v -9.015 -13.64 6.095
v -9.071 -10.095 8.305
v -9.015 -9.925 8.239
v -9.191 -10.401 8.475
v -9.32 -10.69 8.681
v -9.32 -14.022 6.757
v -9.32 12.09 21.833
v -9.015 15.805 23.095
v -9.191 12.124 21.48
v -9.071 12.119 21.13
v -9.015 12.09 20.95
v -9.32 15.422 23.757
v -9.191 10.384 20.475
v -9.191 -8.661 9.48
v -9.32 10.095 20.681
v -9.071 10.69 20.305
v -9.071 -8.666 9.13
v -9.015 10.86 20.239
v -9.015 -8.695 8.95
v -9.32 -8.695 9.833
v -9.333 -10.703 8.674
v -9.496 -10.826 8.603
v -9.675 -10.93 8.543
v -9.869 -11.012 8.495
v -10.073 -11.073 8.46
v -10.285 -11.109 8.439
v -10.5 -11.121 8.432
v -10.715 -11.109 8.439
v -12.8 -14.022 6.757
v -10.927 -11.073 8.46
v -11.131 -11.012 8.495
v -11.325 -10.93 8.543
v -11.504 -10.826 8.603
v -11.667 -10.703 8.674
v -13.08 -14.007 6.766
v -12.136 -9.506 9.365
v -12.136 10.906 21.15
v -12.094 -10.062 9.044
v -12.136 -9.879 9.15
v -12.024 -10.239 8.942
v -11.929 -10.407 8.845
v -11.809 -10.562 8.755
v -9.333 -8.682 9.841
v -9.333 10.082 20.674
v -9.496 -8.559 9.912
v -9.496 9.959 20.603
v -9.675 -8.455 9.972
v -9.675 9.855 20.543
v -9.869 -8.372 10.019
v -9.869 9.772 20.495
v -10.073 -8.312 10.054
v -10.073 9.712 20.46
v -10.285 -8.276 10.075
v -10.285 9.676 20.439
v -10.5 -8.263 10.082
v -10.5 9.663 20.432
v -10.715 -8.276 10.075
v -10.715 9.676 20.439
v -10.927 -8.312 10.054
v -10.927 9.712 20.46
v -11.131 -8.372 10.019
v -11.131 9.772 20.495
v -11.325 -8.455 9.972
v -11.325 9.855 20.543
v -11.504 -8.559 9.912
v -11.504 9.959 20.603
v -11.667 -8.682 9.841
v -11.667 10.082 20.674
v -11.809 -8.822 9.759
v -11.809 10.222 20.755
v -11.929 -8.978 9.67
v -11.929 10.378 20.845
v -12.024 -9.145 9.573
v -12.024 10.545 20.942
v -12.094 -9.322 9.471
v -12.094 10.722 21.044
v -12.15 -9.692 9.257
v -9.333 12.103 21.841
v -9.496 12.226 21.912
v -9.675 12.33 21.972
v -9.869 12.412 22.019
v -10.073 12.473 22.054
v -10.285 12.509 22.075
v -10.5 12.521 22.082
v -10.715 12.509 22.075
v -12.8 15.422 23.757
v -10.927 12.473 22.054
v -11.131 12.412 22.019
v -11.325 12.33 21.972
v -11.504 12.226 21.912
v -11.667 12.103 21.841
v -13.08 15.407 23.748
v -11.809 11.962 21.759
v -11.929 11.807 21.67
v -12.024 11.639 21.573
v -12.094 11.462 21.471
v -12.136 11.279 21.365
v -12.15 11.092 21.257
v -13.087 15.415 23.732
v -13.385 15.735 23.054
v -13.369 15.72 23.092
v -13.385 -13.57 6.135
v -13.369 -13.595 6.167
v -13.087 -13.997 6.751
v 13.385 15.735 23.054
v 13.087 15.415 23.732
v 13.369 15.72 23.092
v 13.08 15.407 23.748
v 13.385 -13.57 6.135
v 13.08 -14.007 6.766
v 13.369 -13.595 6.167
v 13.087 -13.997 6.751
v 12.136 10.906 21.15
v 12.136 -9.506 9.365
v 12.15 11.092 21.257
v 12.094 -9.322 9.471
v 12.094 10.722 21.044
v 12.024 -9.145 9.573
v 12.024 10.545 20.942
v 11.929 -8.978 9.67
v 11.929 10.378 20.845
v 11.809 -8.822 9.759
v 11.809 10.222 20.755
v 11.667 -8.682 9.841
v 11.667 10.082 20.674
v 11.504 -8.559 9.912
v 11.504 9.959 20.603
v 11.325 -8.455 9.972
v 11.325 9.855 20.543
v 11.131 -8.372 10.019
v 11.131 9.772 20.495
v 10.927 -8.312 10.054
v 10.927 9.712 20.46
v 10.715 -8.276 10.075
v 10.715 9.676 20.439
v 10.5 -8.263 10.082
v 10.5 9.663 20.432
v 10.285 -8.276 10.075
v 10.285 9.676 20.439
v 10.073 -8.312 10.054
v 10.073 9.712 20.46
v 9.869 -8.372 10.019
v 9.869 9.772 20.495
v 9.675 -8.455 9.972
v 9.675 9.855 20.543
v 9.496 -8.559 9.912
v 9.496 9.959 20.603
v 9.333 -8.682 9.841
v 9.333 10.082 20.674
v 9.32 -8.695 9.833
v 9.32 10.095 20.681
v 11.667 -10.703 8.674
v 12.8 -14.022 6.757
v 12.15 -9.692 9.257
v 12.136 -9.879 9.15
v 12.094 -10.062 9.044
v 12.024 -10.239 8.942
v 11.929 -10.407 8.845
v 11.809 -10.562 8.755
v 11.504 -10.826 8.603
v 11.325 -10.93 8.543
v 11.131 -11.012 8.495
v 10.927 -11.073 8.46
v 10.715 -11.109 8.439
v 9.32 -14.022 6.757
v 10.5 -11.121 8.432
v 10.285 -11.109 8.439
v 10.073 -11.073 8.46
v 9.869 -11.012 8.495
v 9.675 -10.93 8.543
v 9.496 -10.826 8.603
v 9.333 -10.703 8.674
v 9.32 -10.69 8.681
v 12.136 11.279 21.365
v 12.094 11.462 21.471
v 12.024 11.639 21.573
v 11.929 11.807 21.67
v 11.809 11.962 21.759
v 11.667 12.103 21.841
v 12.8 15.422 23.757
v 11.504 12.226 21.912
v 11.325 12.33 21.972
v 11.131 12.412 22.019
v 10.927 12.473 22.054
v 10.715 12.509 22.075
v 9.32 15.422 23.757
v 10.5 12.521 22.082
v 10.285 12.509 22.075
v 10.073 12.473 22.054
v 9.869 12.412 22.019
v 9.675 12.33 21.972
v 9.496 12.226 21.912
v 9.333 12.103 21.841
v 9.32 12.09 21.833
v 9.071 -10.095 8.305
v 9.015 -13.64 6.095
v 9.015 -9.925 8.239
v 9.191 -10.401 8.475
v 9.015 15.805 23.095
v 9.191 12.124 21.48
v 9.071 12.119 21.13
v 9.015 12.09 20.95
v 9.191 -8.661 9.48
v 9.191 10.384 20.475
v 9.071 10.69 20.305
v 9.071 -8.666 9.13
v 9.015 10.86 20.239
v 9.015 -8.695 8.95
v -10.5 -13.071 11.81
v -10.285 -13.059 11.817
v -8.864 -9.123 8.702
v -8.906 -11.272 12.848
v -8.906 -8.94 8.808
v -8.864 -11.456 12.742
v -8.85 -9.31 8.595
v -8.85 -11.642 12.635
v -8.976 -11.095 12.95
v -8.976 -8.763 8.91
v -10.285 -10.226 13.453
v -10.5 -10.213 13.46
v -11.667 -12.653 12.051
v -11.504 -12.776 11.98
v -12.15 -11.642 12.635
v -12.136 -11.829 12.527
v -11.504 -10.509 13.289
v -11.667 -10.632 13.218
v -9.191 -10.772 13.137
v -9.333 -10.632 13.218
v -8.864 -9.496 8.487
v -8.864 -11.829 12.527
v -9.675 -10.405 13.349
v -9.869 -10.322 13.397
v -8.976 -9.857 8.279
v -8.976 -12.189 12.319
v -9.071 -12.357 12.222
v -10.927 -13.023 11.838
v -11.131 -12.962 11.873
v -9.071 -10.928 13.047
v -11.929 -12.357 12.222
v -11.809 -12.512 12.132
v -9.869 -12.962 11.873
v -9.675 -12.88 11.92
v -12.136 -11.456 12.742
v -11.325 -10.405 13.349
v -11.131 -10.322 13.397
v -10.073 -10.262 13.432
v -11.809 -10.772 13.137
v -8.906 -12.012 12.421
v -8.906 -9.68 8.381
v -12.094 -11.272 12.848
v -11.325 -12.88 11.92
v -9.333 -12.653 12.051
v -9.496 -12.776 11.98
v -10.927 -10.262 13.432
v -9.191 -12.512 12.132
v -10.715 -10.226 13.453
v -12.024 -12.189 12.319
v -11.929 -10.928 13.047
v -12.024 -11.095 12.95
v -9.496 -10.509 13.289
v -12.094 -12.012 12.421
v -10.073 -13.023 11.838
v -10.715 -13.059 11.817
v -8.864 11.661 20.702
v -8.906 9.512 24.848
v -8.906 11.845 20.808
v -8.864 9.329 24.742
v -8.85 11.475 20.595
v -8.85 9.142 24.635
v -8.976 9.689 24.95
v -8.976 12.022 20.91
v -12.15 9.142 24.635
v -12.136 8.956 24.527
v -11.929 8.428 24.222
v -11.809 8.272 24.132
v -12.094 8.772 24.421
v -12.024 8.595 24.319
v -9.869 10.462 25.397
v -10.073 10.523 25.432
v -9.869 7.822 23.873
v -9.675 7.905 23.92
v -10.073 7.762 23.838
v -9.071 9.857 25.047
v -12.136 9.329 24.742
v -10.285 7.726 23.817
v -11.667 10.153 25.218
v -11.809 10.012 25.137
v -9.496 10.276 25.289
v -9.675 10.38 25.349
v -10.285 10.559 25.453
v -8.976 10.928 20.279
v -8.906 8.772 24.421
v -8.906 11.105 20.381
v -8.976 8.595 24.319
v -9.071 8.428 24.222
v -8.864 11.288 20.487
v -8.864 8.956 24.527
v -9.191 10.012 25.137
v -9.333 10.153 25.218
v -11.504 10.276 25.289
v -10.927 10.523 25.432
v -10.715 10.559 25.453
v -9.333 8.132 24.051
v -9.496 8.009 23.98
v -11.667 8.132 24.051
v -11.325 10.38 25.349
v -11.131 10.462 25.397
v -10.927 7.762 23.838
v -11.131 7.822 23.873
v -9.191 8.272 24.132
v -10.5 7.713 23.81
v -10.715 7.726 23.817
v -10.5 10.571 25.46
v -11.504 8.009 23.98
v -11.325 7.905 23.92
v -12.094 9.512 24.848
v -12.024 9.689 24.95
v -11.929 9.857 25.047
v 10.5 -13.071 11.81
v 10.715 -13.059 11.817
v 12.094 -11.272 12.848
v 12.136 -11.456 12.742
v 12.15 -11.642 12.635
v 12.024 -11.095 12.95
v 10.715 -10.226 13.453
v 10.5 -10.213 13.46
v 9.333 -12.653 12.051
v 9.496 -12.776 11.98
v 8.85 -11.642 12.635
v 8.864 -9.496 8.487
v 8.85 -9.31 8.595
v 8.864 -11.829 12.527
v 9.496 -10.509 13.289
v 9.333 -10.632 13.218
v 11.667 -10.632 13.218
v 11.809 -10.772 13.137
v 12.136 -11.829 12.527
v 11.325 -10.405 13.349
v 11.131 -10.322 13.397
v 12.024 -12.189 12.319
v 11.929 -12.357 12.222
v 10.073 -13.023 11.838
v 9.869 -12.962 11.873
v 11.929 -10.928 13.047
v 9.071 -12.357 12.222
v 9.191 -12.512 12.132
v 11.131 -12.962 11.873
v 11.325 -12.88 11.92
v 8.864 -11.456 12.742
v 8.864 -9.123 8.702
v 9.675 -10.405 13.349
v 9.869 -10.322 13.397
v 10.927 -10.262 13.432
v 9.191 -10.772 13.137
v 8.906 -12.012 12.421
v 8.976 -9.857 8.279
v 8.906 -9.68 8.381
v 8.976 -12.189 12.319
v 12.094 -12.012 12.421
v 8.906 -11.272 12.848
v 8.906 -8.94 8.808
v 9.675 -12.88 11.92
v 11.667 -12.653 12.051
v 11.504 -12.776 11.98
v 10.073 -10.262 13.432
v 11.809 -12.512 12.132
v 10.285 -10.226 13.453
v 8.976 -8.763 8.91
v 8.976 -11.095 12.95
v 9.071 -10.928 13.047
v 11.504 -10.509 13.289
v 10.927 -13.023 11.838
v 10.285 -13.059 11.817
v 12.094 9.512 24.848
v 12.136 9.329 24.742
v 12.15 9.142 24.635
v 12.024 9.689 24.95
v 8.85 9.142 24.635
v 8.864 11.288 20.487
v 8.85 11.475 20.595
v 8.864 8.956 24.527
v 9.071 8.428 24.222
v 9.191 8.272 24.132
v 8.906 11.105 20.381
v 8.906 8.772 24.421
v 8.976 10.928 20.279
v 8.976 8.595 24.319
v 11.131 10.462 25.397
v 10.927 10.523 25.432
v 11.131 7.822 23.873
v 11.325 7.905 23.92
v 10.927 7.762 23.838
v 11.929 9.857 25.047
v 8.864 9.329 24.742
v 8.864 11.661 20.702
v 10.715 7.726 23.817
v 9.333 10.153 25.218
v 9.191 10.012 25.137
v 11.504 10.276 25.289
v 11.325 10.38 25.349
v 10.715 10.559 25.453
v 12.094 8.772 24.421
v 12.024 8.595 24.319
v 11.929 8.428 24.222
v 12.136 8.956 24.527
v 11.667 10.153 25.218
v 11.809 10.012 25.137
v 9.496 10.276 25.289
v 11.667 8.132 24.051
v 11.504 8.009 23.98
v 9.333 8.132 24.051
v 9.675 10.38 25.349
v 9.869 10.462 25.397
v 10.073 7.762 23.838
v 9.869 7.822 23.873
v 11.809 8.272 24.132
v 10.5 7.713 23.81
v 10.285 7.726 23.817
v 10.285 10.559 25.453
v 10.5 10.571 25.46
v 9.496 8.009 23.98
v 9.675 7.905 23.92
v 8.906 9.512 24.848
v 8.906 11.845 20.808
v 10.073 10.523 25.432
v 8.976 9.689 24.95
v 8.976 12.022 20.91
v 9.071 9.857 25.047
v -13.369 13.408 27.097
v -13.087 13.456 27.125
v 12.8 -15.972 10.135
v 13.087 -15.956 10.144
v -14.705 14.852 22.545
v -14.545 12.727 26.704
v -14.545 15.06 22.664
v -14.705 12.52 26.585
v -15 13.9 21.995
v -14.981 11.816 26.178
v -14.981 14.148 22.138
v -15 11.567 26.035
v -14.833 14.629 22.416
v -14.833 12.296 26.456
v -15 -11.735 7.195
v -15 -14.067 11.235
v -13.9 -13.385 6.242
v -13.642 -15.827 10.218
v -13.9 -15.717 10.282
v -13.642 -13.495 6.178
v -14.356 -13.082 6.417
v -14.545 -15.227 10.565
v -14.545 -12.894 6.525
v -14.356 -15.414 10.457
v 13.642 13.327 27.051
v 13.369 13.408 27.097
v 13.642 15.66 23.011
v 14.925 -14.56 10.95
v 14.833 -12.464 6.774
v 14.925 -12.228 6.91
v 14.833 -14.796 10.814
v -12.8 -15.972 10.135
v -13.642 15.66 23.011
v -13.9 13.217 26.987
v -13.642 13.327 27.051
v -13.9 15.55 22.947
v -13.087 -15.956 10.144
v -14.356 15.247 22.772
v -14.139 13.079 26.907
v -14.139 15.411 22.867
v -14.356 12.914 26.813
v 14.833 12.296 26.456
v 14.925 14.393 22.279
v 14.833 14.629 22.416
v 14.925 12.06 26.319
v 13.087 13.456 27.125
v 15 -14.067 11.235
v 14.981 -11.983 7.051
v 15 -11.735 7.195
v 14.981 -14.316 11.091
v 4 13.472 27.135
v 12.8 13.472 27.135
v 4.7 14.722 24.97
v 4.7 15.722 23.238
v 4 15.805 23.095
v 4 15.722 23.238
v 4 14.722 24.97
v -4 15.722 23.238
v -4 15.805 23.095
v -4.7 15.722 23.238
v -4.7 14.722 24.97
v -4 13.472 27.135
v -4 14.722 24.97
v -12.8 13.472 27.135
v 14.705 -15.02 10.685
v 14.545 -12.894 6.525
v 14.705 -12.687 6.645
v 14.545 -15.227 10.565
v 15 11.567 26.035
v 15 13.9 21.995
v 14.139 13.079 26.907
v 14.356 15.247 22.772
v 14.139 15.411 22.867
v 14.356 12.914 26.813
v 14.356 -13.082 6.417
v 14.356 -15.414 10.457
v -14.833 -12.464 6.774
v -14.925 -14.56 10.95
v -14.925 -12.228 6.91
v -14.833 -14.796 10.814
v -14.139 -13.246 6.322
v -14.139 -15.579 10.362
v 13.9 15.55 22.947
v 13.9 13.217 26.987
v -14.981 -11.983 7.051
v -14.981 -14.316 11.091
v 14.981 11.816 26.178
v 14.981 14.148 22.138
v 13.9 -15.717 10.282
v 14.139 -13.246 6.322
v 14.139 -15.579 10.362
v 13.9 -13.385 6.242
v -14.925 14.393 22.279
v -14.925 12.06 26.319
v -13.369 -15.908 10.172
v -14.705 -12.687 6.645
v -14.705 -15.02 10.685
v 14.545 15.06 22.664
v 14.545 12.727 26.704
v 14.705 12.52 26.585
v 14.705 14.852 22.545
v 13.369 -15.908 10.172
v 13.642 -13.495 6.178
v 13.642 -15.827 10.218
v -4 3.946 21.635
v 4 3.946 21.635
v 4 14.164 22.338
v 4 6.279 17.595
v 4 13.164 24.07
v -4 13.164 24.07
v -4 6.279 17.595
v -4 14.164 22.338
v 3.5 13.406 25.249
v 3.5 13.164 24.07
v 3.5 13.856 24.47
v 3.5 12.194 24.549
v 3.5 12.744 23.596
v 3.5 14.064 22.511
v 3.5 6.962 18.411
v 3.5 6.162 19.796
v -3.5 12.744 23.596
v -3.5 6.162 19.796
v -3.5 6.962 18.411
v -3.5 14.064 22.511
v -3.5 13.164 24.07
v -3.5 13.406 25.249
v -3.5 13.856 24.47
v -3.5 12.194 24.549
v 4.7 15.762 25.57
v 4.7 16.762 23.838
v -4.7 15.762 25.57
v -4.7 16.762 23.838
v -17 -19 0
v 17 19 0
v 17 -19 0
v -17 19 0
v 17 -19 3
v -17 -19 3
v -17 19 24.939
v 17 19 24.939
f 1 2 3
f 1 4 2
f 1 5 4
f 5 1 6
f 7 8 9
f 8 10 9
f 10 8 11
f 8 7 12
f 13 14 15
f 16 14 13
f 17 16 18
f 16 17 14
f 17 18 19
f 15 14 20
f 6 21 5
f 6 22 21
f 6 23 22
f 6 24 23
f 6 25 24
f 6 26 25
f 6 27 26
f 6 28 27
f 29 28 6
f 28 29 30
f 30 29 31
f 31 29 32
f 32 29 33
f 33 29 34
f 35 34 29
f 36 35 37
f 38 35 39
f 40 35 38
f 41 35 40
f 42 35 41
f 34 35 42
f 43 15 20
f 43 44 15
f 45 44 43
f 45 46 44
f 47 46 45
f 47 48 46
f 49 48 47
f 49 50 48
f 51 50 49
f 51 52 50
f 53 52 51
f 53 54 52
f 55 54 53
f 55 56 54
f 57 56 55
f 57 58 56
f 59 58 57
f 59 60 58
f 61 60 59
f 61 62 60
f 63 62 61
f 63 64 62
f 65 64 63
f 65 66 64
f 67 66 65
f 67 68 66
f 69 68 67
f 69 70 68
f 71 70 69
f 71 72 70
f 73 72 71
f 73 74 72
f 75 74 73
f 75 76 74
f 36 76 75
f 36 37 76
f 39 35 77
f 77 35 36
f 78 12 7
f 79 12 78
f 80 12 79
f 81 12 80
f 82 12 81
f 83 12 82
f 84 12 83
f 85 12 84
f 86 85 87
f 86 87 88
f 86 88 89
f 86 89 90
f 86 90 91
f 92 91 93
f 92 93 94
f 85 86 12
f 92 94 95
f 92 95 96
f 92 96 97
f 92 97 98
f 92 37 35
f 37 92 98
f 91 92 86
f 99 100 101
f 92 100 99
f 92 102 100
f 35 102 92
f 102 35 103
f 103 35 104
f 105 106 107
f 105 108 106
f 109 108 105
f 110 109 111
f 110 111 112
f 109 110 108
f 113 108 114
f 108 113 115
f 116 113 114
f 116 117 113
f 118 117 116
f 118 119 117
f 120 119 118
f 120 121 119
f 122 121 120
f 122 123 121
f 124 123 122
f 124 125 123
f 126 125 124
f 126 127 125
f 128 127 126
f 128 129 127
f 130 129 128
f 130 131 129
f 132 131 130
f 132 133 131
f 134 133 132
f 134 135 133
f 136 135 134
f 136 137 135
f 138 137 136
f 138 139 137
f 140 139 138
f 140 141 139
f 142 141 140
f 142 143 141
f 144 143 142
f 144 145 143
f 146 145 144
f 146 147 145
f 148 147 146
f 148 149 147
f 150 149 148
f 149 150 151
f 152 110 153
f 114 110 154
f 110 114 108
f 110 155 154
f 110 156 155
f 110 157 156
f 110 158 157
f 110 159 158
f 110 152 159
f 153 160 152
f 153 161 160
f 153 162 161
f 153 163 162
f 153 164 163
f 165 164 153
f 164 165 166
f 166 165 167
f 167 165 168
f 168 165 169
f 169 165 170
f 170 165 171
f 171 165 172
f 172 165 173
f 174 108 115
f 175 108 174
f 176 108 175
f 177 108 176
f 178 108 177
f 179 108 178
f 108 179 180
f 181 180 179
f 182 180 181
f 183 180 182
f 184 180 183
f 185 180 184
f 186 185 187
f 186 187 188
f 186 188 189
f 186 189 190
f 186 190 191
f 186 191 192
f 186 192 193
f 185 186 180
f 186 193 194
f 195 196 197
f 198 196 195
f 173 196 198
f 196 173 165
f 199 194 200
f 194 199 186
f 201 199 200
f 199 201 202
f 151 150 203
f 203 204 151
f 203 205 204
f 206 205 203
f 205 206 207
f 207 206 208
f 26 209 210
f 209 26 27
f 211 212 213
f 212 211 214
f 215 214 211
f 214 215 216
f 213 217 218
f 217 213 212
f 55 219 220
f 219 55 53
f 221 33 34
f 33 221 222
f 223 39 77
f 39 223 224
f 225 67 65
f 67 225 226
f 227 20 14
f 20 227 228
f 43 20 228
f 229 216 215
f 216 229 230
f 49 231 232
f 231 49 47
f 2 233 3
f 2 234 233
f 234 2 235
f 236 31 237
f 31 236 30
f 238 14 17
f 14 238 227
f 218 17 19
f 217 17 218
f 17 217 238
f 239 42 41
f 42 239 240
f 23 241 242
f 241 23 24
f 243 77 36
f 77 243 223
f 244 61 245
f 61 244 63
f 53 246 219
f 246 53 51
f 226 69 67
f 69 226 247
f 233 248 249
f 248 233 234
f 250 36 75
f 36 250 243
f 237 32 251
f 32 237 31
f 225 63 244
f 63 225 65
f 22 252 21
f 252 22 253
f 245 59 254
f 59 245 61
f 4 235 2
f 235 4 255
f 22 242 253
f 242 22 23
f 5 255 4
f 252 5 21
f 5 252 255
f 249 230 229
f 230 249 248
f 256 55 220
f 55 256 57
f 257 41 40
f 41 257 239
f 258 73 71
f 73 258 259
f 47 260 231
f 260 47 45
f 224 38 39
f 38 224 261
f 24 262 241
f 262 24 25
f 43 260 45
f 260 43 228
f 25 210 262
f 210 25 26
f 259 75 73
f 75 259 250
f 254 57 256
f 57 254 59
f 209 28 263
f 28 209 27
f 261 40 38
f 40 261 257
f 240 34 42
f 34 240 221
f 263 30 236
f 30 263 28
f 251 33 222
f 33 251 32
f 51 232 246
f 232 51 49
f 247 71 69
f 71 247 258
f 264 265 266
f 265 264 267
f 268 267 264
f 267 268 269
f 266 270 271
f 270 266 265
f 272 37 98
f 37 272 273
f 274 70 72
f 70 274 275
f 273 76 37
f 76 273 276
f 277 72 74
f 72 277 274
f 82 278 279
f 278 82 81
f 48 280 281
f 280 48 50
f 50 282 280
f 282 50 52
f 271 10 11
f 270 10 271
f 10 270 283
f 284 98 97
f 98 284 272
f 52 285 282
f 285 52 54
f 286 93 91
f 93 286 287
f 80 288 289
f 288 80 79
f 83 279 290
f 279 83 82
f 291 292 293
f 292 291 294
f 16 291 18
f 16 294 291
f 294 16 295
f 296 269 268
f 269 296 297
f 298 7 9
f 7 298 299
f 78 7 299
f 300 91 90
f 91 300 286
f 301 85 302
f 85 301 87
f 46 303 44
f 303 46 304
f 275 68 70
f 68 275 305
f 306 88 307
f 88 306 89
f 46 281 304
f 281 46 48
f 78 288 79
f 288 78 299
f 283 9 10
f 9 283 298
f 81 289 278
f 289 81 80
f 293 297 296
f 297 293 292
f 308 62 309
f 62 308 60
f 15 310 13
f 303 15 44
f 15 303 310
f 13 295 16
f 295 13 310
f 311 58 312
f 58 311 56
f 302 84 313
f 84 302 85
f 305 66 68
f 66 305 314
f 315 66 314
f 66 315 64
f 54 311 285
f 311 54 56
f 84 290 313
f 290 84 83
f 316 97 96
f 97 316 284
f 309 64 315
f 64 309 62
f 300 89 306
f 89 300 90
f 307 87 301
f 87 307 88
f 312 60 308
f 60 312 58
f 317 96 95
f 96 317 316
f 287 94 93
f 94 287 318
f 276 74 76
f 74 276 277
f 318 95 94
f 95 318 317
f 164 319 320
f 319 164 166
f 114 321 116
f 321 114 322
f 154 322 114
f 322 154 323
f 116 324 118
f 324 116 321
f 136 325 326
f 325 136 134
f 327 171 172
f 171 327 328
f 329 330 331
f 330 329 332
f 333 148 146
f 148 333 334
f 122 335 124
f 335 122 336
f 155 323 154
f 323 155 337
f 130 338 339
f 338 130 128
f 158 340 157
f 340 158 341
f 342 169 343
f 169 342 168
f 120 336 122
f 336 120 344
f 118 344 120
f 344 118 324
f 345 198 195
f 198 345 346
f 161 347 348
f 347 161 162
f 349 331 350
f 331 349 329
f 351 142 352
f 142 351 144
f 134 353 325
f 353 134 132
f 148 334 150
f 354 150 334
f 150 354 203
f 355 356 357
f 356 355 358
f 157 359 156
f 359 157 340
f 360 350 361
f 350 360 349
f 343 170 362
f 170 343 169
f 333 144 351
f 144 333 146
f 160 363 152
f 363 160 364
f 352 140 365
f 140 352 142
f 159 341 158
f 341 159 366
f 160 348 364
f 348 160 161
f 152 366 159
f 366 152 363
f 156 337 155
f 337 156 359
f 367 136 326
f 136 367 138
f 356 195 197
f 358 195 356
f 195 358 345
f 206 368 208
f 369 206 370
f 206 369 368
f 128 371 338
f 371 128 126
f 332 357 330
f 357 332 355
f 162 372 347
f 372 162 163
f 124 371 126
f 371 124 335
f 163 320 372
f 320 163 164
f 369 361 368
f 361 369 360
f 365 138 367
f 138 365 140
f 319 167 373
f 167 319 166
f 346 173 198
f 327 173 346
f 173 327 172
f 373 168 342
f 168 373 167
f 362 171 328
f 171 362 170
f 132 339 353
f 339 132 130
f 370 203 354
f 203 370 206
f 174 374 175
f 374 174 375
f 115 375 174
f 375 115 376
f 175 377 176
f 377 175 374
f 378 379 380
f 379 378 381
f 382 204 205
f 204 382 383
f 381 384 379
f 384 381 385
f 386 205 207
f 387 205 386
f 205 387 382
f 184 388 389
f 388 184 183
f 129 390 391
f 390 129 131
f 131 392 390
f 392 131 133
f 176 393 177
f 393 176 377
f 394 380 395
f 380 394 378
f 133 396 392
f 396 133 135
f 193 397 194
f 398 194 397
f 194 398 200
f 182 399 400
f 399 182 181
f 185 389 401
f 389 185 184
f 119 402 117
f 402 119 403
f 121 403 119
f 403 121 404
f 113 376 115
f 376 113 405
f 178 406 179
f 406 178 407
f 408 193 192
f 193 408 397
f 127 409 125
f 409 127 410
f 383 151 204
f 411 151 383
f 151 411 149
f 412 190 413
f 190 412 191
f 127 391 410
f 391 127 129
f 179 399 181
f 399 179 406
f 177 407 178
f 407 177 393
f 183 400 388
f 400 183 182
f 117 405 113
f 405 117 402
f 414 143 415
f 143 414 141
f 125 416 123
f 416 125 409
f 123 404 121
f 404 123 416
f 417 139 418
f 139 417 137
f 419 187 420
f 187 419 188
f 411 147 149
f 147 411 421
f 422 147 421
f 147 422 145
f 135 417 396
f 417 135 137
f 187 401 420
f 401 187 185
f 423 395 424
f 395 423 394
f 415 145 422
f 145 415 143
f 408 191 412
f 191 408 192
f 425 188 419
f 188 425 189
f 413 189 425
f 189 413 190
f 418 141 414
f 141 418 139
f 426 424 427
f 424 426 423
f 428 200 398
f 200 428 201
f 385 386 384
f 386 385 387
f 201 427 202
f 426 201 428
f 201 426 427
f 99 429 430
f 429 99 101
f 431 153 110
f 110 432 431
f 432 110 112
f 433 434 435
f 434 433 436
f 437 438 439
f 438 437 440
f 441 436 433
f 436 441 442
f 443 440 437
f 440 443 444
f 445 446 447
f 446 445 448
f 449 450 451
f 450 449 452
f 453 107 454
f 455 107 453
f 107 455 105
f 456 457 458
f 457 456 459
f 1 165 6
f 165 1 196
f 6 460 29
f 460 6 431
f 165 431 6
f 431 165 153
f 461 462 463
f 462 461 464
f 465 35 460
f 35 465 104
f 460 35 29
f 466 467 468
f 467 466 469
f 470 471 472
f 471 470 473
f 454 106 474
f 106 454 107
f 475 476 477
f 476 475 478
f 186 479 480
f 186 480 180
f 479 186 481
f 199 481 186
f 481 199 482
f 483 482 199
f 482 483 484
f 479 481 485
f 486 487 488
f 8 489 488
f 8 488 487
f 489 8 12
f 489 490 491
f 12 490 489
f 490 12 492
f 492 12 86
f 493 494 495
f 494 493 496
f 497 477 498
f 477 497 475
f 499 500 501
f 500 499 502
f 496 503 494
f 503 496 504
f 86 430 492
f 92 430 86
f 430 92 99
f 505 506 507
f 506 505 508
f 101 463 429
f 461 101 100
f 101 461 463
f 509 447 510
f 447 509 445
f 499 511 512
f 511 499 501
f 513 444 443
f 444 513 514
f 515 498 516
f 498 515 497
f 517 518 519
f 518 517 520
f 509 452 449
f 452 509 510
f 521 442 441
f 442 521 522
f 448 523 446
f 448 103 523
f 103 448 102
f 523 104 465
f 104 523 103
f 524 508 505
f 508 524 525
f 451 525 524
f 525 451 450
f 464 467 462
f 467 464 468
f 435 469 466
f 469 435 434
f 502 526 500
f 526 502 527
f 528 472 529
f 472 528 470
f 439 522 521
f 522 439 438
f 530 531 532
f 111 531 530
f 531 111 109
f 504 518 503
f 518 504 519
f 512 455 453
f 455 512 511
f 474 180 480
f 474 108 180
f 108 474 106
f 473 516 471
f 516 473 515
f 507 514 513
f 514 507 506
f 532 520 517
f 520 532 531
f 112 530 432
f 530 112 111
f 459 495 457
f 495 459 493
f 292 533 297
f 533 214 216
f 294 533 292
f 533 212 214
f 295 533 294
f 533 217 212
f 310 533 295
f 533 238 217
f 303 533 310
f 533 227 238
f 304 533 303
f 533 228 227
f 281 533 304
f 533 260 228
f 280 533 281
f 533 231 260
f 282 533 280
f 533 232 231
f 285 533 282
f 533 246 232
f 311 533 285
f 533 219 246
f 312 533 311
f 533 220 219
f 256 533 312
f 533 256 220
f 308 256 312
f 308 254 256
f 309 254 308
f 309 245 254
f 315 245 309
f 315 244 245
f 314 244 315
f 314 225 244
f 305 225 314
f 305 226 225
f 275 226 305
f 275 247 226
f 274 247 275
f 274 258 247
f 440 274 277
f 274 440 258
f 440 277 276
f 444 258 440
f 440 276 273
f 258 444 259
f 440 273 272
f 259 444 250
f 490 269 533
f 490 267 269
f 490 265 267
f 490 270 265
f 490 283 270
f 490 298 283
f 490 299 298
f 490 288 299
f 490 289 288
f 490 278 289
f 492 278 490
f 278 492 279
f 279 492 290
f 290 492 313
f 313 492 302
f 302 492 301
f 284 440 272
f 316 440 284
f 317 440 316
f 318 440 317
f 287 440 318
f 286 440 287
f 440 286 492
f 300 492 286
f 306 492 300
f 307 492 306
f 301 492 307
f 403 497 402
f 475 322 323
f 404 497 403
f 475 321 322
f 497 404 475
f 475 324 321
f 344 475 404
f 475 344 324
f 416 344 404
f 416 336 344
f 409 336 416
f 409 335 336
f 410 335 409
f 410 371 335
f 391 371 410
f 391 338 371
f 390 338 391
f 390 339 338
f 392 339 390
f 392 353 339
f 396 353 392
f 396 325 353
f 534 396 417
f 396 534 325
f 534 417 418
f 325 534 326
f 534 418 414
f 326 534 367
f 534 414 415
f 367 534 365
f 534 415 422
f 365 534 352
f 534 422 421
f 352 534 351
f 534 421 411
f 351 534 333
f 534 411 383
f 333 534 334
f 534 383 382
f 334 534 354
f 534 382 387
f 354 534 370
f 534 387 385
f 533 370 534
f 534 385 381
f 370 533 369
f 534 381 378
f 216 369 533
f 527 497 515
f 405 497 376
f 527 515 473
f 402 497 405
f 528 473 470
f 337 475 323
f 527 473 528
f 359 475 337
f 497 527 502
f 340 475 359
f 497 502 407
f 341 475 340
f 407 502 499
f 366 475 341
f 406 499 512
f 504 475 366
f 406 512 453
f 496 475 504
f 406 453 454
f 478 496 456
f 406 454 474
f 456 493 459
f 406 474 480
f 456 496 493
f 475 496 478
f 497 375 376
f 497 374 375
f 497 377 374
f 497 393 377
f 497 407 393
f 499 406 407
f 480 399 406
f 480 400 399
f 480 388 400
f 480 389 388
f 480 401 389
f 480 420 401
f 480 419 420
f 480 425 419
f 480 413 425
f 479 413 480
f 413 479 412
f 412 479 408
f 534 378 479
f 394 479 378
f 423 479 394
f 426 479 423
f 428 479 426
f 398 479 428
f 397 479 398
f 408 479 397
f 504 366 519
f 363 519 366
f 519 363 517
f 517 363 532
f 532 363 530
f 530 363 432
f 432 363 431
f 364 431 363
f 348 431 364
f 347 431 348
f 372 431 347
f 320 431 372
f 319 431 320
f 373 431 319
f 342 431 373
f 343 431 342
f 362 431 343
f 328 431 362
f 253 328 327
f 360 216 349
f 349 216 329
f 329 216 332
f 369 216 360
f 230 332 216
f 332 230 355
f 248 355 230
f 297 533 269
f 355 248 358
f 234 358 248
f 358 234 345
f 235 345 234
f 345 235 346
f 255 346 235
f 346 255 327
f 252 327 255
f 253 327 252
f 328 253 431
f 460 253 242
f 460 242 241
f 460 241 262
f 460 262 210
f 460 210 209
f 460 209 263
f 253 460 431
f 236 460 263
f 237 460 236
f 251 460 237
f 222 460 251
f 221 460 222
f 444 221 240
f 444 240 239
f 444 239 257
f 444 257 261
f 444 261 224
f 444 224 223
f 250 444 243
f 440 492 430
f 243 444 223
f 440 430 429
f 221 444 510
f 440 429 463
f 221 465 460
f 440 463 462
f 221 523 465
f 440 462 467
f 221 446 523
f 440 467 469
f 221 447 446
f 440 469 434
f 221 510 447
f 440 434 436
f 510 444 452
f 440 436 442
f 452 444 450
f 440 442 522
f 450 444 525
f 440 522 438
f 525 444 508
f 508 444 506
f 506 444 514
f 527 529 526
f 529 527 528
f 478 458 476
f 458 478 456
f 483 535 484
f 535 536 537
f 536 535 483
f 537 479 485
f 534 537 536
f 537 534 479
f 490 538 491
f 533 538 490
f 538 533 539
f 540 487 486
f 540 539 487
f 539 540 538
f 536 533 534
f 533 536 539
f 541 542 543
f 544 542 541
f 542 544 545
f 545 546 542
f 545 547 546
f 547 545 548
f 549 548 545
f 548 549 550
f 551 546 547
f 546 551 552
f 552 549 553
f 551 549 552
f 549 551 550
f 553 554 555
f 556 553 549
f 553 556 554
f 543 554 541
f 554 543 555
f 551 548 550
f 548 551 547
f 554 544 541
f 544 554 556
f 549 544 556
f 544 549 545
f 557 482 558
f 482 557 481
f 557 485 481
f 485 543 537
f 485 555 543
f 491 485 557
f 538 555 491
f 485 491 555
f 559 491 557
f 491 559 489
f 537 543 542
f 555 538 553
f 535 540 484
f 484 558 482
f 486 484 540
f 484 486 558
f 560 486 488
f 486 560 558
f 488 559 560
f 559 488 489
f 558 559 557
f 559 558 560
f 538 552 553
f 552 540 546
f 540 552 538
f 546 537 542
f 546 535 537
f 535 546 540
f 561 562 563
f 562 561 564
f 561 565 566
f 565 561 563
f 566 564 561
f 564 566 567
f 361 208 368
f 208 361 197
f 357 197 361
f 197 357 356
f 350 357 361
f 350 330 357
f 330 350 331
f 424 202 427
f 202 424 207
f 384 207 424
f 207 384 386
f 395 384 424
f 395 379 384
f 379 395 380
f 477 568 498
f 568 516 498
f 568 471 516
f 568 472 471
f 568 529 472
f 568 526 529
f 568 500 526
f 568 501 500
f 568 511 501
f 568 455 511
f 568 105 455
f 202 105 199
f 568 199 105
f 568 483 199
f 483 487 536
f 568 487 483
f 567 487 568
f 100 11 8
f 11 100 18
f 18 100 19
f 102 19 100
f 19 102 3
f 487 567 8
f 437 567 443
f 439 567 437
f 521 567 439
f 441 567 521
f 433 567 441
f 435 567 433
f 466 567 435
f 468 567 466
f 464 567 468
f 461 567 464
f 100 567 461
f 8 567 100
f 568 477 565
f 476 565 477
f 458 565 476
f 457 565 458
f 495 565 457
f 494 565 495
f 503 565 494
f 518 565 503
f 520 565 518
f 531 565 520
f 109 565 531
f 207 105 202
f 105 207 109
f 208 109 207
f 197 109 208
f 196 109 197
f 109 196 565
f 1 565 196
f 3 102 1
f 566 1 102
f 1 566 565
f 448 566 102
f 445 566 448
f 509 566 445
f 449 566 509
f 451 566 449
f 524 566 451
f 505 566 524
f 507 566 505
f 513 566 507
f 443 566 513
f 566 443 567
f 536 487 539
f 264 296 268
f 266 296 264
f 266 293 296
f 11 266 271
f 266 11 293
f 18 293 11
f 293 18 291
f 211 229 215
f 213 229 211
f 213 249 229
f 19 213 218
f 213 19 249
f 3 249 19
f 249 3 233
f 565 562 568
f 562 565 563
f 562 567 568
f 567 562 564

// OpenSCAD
// file: rm_common.scad
// RobotMind Modular Ecosystem — common library
// Rev A concept for FDM prototyping, designed to migrate to injection molding.
$fn = 48;

// ---- Global mechanical interface ----
RM_DOCK_W = 30;
RM_DOCK_L = 34;
RM_DOCK_H = 5;
RM_RAIL_H = 2.6;
RM_RAIL_W = 3.2;
RM_RAIL_INSET = 3.8;
RM_CLEARANCE = 0.28;   // FDM sliding clearance per side
RM_LATCH_W = 7;
RM_LATCH_L = 9;
RM_LATCH_T = 1.6;
RM_LATCH_HOOK = 1.1;
RM_M3 = 3.3;

module rounded_box(size=[20,20,3], r=2, center=false) {
    x=size[0]; y=size[1]; z=size[2];
    translate(center ? [-x/2,-y/2,-z/2] : [0,0,0])
    linear_extrude(height=z)
      offset(r=r)
      offset(delta=-r)
      square([x,y]);
}

module slot2d(len=10, d=3) {
    hull(){
      translate([-len/2+d/2,0]) circle(d=d);
      translate([ len/2-d/2,0]) circle(d=d);
    }
}

// Male dovetail rail. The simplified trapezoid is robust in FDM and moldable.
module dovetail_rail(len=RM_DOCK_L-4, w=RM_RAIL_W, h=RM_RAIL_H) {
    linear_extrude(height=len)
      polygon(points=[[-w/2,0],[w/2,0],[w/2+1.0,h],[-w/2-1.0,h]]);
}

// Female channel cutter, slightly oversized.
module dovetail_channel(len=RM_DOCK_L, w=RM_RAIL_W+2*RM_CLEARANCE, h=RM_RAIL_H+RM_CLEARANCE) {
    linear_extrude(height=len)
      polygon(points=[[-w/2,0],[w/2,0],[w/2+1.15,h],[-w/2-1.15,h]]);
}

module male_interface() {
    // Interface origin centered X/Y, bottom at Z=0.
    for (sx=[-1,1])
      translate([sx*(RM_DOCK_W/2-RM_RAIL_INSET), -RM_DOCK_L/2+2, 0])
        rotate([-90,0,0]) dovetail_rail();
    // central catch boss engaged by dock latch
    translate([-RM_LATCH_W/2, RM_DOCK_L/2-7, 0])
      cube([RM_LATCH_W,4,1.25]);
}

module dock_body_base() {
    difference(){
      rounded_box([RM_DOCK_W,RM_DOCK_L,RM_DOCK_H],2.2,center=true);
      // open female dovetails from insertion side
      for (sx=[-1,1])
        translate([sx*(RM_DOCK_W/2-RM_RAIL_INSET), -RM_DOCK_L/2-0.2, -RM_DOCK_H/2+1.1])
          rotate([-90,0,0]) dovetail_channel(len=RM_DOCK_L+1);
      // four M3 mounting holes
      for(x=[-10.5,10.5], y=[-12,12]) translate([x,y,0]) cylinder(h=RM_DOCK_H+2,d=RM_M3,center=true);
      // latch relief window
      translate([-RM_LATCH_W/2-0.5, RM_DOCK_L/2-11, -RM_DOCK_H/2-0.1]) cube([RM_LATCH_W+1,11,RM_DOCK_H+1]);
    }
}

module latch_finger() {
    // flexible cantilever integrated at back of dock
    translate([-RM_LATCH_W/2, RM_DOCK_L/2-10, -RM_DOCK_H/2+0.7]) {
      cube([RM_LATCH_W,RM_LATCH_L,RM_LATCH_T]);
      translate([0,RM_LATCH_L-1.4,RM_LATCH_T]) cube([RM_LATCH_W,1.4,RM_LATCH_HOOK]);
      // thumb tab
      translate([-1.2,RM_LATCH_L-0.8,-0.2]) cube([RM_LATCH_W+2.4,3,RM_LATCH_T+0.4]);
    }
}

module universal_dock() {
    union(){ dock_body_base(); latch_finger(); }
}

module sensor_carrier(pcb=[20,20], wall=1.7, floor=1.8, clearance=0.5) {
    // carrier top tray centered; universal male interface below
    W=pcb[0]+2*(wall+clearance);
    L=pcb[1]+2*(wall+clearance);
    union(){
      translate([-W/2,-L/2,0]) difference(){
        rounded_box([W,L,floor+3.1],2);
        translate([wall,wall,floor]) rounded_box([pcb[0]+2*clearance,pcb[1]+2*clearance,5],1.0);
        // cable exit on front edge
        translate([W/2-6,-0.2,floor+0.5]) cube([12,wall+1,3.5]);
      }
      // small retention lips; gentle, printable snap
      for(x=[-W/2+2.2,W/2-2.2], y=[-L/2+2.2,L/2-2.2])
         translate([x,y,floor+2.5]) cylinder(h=1.3,d=2.2);
      translate([0,0,-RM_RAIL_H]) male_interface();
    }
}

module tag_insert(tag=[60,60], border=3.0, t=1.0, pulltab=true) {
    W=tag[0]+2*border; H=tag[1]+2*border;
    union(){
      translate([-W/2,-H/2,0]) rounded_box([W,H,t],1.2);
      if(pulltab) translate([-8,-H/2-4,0]) rounded_box([16,5,t],1.2);
    }
}

module tag_insert_rails(tag=[60,60], border=4, rail=1.5, depth=2.2) {
    W=tag[0]+2*border; H=tag[1]+2*border;
    // rails intended to capture tag insert edges
    for(sx=[-1,1]) translate([sx*(W/2-rail/2),0,0]) cube([rail,H,depth],center=true);
    translate([0,H/2-rail/2,0]) cube([W,rail,depth],center=true); // hard stop
}

module angle_wedge(angle=15, footprint=[RM_DOCK_W+4,RM_DOCK_L+4], min_h=3) {
    // solid wedge with top angled; child dock can be placed on top by caller
    W=footprint[0]; L=footprint[1]; dh=tan(angle)*L;
    polyhedron(points=[
      [-W/2,-L/2,0],[W/2,-L/2,0],[W/2,L/2,0],[-W/2,L/2,0],
      [-W/2,-L/2,min_h],[W/2,-L/2,min_h],[W/2,L/2,min_h+dh],[-W/2,L/2,min_h+dh]
    ], faces=[[0,1,2,3],[4,7,6,5],[0,4,5,1],[1,5,6,2],[2,6,7,3],[3,7,4,0]]);
}
// main file
include <rm_common.scad>
ANGLE=30; // 0, 15, 30 or 45. 90 is a wall bracket style in its dedicated file.
if(ANGLE==0) universal_dock();
else {
  L=RM_DOCK_L+4; MINH=3; DH=tan(ANGLE)*L;
  union(){
    angle_wedge(ANGLE);
    translate([0,0,MINH+DH/2+RM_DOCK_H/2]) rotate([ANGLE,0,0]) universal_dock();
  }
}
